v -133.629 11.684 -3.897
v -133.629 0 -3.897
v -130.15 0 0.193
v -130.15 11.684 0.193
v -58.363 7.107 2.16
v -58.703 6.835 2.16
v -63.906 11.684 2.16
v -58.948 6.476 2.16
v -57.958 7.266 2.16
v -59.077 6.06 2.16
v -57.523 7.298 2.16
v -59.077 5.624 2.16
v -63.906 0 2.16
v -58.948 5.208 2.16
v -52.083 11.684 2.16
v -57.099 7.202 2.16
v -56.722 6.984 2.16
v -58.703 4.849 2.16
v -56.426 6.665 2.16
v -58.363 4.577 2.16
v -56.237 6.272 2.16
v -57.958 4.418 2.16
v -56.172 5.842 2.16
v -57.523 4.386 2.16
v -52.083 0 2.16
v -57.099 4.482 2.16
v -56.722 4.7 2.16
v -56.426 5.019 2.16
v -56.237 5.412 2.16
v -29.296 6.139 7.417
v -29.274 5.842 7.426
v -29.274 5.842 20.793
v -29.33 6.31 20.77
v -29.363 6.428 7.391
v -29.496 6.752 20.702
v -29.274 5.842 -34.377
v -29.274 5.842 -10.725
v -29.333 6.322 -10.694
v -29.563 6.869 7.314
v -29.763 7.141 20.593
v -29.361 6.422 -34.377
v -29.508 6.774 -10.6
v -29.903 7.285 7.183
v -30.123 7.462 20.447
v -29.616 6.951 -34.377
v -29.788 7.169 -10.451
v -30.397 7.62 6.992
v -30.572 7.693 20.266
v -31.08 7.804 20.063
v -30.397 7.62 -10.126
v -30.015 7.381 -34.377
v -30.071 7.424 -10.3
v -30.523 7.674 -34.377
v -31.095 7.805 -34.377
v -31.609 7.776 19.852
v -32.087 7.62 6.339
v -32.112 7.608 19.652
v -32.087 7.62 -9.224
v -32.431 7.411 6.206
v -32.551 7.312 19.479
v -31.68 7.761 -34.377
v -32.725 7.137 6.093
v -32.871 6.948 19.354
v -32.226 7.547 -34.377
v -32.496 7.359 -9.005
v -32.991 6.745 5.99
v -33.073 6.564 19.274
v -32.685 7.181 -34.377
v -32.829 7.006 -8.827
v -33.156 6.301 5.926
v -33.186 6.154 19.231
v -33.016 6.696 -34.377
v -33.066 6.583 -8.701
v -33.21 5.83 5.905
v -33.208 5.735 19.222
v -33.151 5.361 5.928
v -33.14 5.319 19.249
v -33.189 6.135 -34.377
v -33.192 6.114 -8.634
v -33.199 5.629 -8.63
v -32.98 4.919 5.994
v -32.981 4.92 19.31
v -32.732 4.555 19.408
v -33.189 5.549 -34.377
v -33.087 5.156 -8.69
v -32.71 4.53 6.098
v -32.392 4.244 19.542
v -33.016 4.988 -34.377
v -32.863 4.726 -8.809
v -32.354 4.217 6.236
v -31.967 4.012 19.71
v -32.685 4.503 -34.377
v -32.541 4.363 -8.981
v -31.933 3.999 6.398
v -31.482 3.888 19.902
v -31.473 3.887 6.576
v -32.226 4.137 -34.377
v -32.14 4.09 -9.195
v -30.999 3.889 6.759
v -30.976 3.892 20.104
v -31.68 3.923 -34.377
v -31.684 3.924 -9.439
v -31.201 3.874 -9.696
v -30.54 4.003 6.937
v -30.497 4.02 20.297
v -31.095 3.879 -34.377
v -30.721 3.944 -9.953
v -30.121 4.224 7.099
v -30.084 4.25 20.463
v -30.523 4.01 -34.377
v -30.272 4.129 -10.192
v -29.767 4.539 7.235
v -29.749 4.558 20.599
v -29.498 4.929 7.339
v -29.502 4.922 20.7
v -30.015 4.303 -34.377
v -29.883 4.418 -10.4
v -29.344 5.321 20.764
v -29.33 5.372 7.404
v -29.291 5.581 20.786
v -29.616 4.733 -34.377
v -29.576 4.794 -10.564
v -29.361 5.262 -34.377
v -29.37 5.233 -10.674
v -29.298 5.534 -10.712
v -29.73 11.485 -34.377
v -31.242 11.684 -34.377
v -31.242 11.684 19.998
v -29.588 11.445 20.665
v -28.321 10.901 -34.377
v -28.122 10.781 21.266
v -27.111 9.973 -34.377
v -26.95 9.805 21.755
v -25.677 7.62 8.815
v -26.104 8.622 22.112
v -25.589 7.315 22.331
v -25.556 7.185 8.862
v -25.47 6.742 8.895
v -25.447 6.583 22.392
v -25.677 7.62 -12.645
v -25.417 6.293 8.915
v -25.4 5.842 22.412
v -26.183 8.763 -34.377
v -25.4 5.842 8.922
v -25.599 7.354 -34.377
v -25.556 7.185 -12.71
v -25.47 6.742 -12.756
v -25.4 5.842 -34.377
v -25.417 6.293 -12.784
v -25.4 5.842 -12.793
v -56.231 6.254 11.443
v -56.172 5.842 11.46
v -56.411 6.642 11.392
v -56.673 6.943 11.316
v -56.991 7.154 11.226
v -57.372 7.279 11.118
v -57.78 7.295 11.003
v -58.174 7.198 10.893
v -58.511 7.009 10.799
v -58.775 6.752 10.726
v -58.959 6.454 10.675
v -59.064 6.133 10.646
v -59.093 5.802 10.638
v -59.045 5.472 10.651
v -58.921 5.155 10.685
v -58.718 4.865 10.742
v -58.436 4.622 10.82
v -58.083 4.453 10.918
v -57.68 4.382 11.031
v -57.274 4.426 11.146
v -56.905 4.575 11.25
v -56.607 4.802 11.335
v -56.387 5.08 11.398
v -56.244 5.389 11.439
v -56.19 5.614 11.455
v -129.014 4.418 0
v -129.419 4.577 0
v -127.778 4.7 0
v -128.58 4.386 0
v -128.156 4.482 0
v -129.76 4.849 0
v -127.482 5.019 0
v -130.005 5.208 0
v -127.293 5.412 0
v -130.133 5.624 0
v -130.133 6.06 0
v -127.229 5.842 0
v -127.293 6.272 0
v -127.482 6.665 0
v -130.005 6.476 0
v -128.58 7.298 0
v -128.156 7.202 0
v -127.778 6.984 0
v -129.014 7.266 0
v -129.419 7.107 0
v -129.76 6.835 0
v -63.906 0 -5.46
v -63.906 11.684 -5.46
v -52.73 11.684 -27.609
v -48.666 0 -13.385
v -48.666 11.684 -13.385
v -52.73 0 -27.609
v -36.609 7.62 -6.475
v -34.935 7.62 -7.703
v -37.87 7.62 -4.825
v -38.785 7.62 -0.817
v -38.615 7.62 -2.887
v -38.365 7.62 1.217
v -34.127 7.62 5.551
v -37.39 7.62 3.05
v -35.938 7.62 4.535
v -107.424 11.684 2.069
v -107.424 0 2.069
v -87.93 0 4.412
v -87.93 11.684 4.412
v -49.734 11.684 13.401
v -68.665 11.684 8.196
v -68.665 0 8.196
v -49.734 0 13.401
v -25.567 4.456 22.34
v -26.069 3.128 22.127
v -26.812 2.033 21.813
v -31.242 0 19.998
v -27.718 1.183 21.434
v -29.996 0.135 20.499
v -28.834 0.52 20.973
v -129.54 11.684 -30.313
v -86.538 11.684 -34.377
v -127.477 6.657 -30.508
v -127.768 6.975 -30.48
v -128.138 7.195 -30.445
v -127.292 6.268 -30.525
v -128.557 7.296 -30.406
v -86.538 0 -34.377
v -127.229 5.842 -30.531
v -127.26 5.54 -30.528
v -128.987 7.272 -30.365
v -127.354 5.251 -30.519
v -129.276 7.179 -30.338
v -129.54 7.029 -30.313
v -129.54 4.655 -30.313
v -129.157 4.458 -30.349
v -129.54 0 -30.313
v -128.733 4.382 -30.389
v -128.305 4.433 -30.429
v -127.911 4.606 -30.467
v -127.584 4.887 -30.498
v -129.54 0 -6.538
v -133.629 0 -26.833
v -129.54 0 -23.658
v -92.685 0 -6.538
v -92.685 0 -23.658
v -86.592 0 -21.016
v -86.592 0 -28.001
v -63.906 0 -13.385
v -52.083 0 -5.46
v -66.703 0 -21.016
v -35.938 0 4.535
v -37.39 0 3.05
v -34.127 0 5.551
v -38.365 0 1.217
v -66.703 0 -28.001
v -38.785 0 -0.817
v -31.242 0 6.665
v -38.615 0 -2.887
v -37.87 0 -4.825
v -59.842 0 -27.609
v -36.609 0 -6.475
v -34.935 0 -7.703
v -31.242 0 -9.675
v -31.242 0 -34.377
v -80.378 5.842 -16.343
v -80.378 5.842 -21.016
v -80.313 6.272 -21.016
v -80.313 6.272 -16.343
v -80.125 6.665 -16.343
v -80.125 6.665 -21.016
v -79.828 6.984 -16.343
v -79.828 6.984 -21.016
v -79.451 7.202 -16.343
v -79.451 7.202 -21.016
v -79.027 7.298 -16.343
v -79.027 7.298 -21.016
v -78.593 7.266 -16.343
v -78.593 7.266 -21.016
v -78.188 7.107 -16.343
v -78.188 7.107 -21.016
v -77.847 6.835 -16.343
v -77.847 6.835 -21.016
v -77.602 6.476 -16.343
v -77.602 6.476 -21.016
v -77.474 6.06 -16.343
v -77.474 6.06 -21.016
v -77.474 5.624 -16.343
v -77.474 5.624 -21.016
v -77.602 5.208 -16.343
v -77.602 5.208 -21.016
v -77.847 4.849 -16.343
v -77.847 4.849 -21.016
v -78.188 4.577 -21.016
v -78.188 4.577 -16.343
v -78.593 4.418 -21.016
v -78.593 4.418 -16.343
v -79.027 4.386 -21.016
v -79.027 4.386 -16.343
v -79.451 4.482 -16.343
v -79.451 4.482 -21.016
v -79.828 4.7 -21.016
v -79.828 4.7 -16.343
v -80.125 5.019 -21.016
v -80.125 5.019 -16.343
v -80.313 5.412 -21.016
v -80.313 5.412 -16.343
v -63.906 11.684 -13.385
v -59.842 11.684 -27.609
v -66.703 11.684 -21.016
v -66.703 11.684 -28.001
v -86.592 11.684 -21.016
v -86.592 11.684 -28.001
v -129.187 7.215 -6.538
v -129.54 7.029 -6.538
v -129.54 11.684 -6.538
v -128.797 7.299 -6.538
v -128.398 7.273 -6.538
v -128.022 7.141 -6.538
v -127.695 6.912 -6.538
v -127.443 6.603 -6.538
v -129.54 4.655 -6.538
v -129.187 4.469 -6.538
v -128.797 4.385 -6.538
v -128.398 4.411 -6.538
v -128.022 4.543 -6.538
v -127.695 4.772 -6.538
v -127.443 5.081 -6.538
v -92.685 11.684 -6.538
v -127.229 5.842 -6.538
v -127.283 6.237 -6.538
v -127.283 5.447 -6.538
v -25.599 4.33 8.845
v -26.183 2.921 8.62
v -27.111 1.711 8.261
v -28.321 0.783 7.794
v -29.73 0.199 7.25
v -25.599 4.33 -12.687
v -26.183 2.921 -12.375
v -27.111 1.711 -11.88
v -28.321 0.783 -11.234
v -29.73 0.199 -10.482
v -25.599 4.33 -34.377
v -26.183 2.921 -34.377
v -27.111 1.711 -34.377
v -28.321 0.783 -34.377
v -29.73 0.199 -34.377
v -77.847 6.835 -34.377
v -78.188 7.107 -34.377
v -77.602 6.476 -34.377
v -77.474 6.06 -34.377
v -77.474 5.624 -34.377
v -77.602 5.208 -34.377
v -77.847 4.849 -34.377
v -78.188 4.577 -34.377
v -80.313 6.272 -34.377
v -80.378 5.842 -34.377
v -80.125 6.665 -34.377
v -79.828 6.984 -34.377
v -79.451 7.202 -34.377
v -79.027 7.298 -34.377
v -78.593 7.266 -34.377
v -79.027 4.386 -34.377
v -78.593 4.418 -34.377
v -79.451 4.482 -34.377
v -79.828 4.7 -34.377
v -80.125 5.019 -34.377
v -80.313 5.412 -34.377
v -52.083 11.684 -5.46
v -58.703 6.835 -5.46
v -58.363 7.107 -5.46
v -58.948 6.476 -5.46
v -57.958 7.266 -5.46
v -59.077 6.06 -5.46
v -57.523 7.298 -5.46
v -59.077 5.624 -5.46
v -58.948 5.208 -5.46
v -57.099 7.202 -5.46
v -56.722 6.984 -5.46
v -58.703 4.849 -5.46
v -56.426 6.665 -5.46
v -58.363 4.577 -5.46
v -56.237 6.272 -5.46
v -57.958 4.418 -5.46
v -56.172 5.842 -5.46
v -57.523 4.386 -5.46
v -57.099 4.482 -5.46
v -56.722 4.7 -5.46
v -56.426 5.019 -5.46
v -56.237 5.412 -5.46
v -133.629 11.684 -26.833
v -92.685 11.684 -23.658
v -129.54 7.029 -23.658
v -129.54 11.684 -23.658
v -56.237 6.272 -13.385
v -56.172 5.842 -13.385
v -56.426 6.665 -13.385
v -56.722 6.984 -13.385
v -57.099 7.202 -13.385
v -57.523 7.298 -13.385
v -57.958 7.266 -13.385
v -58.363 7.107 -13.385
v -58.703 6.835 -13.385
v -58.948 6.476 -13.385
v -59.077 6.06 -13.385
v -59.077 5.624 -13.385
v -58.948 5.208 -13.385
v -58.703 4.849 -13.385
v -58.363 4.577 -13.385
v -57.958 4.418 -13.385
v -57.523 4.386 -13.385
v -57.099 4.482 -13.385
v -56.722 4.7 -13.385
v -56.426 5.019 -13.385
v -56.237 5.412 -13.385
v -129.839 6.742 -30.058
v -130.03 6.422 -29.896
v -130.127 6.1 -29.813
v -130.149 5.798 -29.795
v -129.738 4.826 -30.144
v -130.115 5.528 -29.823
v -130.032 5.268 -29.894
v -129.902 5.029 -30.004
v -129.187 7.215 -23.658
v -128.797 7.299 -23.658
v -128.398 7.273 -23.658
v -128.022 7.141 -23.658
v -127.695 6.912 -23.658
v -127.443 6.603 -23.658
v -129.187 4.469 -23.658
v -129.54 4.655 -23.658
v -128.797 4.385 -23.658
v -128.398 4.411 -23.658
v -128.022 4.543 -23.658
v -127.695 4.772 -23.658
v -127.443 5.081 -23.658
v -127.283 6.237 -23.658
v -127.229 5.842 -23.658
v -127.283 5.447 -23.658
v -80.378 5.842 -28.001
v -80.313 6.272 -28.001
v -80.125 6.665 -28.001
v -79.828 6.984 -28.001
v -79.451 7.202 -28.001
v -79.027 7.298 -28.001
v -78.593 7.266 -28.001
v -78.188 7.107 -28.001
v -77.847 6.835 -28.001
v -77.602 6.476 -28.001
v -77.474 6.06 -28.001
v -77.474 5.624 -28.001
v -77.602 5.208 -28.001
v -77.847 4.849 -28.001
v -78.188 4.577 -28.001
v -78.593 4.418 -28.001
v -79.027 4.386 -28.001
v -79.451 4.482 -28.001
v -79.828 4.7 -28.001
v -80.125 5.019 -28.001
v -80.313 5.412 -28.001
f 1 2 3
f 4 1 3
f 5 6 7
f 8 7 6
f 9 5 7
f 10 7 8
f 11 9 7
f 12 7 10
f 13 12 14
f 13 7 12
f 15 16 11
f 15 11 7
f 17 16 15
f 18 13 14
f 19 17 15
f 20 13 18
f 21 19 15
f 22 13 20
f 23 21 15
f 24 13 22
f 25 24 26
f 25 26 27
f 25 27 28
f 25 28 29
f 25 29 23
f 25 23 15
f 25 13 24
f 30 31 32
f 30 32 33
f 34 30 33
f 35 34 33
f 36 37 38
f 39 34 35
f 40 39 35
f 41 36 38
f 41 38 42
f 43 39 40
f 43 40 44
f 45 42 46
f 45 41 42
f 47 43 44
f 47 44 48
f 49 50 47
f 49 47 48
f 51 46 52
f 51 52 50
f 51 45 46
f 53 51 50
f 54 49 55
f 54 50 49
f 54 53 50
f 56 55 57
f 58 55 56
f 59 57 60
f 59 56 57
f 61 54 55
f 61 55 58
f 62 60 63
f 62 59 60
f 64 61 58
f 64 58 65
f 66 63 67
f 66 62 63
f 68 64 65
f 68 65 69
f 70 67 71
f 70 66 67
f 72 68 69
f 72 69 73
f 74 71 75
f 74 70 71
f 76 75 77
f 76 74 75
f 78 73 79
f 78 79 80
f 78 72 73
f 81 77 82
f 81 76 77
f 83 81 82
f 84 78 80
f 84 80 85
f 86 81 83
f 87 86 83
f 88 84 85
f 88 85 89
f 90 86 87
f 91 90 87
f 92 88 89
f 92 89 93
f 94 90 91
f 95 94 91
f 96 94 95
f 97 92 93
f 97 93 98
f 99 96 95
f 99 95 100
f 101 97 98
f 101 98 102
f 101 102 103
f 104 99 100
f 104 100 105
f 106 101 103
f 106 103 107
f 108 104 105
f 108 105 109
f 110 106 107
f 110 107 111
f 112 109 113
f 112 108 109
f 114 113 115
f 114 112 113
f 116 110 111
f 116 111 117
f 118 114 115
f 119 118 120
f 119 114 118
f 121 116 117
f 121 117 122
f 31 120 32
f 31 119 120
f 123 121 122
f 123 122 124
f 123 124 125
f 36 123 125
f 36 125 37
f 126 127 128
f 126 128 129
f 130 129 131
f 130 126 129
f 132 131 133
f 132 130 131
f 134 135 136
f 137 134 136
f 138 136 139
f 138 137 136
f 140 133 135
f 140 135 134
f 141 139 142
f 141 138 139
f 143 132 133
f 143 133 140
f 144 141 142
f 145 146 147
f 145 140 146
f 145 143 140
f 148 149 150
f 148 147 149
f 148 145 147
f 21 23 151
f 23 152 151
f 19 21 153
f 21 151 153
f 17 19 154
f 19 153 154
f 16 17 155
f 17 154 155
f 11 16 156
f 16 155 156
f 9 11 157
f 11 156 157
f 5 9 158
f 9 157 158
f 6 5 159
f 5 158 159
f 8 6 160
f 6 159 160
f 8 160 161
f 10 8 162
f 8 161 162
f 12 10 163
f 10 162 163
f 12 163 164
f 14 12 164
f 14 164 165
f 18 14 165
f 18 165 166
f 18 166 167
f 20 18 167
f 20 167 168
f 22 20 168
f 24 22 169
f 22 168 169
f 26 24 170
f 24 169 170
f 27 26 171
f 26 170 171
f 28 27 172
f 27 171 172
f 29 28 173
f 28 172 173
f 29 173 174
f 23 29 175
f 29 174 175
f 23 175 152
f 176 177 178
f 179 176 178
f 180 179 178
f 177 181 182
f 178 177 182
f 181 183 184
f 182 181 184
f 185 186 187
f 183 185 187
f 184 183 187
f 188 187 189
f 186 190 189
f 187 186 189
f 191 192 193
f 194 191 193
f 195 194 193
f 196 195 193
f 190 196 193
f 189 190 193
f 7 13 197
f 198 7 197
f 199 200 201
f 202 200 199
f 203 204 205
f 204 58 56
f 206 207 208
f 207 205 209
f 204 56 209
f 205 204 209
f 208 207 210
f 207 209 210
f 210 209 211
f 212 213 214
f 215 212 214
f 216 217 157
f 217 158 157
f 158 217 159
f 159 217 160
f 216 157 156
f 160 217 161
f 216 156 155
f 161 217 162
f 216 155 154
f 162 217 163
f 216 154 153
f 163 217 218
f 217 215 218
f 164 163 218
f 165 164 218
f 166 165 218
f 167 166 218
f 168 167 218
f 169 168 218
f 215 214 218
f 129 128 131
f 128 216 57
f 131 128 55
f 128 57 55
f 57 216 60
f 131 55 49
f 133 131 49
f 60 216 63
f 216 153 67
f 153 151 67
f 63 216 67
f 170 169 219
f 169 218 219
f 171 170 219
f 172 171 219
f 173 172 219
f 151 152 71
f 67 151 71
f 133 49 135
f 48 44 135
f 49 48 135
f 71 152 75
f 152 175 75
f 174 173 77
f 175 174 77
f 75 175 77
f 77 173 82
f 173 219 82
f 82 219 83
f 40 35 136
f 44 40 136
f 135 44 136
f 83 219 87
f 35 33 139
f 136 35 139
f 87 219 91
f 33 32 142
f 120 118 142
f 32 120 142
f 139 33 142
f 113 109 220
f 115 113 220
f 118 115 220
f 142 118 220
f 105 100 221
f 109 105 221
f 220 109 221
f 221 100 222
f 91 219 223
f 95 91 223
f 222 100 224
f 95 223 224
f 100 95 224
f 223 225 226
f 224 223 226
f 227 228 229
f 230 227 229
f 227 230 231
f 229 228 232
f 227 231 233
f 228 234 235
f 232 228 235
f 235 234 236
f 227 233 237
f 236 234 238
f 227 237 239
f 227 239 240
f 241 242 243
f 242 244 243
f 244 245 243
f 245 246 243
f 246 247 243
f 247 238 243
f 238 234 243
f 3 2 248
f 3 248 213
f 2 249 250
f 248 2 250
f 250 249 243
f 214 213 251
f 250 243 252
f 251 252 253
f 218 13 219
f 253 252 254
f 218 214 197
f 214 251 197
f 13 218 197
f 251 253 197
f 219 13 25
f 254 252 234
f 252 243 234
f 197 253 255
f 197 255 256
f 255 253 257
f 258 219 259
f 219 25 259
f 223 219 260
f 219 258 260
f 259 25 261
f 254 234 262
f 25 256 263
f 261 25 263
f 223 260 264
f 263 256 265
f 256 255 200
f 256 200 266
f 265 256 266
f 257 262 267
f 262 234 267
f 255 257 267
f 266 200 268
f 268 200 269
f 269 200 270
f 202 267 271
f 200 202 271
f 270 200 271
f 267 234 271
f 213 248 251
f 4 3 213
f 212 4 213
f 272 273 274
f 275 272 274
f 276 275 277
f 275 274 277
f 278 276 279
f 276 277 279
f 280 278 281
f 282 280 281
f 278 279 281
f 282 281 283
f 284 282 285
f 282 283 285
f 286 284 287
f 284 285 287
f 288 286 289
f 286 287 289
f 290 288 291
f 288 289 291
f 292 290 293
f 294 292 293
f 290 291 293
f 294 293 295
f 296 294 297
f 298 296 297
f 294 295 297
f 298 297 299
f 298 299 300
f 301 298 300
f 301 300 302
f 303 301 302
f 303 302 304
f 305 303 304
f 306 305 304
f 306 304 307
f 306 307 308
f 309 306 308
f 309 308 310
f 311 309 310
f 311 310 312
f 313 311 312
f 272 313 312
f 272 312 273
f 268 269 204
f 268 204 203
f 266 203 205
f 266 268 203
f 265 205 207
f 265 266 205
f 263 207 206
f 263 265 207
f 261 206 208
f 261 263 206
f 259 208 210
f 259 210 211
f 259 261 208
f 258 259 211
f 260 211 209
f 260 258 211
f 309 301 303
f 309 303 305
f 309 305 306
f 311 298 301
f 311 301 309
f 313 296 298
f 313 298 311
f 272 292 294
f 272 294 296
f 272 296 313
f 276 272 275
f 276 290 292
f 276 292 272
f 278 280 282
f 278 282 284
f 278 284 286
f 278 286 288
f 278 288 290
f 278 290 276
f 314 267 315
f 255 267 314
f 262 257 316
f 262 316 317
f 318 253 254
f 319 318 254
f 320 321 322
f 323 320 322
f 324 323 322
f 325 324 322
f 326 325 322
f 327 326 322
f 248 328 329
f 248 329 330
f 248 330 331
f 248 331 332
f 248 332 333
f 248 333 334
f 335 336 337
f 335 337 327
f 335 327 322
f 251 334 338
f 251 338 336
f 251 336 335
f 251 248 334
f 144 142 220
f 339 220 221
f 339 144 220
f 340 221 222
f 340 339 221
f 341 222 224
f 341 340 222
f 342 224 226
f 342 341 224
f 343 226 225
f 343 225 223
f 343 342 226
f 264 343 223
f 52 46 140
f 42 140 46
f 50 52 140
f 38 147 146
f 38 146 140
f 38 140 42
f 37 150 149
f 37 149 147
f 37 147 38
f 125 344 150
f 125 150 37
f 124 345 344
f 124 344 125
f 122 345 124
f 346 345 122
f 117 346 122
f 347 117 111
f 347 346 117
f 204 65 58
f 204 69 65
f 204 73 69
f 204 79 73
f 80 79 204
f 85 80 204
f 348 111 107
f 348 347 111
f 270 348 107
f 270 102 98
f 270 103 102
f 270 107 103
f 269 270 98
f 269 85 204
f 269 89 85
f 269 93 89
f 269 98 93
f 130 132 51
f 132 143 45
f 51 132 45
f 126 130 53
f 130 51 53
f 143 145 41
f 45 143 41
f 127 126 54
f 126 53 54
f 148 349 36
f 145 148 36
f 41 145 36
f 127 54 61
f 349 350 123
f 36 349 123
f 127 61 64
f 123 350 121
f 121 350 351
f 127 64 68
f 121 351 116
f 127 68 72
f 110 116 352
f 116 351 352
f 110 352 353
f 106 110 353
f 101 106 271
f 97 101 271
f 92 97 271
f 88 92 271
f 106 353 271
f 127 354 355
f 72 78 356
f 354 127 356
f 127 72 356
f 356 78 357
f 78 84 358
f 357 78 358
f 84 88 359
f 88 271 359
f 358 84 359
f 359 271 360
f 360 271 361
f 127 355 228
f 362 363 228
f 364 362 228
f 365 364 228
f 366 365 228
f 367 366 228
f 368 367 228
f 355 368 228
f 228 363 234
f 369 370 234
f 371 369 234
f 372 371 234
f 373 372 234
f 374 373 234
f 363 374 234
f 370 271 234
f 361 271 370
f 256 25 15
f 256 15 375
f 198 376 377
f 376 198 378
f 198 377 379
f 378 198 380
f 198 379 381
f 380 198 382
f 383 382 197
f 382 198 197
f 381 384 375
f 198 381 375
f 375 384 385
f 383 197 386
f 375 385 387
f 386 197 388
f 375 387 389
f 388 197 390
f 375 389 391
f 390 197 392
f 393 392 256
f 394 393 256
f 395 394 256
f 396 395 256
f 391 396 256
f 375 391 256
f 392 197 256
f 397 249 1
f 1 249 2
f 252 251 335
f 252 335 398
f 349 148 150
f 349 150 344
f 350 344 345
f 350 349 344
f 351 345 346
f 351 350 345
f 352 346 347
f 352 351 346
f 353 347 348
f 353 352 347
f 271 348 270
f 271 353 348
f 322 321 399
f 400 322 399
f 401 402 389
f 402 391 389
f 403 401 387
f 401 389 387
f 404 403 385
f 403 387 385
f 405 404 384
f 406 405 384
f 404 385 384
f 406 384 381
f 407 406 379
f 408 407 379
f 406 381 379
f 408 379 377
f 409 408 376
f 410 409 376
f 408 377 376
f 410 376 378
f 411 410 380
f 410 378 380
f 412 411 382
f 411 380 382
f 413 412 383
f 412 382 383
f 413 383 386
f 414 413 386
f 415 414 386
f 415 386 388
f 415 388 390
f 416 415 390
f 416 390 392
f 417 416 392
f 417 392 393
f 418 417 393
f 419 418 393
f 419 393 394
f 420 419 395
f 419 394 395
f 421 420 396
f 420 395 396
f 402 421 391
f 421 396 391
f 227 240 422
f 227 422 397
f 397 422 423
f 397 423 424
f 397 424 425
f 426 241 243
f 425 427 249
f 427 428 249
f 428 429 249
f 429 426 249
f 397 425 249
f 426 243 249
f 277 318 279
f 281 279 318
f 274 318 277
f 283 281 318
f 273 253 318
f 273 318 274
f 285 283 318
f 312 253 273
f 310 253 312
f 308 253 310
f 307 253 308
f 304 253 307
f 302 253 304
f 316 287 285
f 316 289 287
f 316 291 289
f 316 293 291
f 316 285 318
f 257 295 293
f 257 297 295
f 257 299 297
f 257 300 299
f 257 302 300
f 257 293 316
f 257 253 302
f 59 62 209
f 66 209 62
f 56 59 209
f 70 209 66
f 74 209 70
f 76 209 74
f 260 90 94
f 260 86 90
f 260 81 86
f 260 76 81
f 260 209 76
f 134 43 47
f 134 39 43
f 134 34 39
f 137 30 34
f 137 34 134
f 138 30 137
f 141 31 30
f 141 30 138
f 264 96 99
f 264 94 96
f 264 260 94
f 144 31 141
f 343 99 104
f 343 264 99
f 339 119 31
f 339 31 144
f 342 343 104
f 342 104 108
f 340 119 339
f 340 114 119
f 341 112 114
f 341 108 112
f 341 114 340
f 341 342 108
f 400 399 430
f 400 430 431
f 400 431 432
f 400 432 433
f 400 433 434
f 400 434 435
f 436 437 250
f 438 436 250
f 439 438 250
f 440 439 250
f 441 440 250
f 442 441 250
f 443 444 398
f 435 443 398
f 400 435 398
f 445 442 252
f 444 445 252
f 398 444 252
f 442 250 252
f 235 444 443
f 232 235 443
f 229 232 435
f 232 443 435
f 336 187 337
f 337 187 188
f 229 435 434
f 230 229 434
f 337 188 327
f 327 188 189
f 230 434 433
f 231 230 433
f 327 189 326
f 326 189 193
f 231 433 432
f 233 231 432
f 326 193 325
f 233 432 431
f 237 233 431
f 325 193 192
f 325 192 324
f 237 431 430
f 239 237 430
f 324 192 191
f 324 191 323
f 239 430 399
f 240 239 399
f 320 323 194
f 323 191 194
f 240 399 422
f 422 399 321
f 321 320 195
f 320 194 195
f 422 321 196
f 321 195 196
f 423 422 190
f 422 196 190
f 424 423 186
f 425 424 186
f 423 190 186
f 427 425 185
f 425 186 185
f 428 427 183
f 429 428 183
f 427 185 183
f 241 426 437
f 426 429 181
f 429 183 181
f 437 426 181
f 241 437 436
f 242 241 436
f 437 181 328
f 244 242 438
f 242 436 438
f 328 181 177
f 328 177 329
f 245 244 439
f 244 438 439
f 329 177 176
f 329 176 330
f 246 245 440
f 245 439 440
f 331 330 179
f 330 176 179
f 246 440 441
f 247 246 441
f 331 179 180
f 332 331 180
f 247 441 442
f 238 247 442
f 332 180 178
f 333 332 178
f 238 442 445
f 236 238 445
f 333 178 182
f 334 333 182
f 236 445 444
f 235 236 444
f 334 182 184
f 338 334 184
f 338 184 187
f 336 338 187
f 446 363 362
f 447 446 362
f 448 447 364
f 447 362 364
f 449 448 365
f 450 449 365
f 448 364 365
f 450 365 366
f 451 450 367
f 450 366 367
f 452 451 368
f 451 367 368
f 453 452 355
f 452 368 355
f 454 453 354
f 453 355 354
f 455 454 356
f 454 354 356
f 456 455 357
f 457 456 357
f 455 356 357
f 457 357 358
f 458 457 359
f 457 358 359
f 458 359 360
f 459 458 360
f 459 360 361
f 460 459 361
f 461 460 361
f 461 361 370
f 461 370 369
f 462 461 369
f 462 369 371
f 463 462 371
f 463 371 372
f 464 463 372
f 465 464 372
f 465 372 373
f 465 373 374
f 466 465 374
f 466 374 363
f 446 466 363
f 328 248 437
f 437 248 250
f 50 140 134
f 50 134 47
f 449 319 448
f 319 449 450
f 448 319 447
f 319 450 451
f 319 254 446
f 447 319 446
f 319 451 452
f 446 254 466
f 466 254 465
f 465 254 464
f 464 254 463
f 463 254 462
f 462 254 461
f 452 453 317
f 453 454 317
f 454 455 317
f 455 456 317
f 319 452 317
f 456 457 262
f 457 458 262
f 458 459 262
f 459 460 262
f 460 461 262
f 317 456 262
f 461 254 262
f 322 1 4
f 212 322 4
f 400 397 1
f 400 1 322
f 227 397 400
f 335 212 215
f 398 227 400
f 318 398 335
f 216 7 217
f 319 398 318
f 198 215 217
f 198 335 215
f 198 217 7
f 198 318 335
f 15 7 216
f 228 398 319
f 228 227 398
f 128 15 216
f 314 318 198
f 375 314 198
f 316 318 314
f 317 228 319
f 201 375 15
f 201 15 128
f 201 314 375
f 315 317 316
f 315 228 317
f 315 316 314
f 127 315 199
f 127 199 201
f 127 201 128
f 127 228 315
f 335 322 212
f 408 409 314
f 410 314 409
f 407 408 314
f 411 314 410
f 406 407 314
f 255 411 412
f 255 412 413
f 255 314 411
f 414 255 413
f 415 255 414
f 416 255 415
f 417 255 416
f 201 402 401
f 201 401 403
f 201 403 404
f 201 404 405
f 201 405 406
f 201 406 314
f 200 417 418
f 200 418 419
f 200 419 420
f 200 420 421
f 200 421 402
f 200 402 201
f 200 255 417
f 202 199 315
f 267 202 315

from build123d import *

# Parameters (mm, degrees)
SKETCH1_W                = 36.8554
SKETCH1_H                = 17.1196
SKETCH1_W_2              = 19.8882
SKETCH1_H_2              = 6.985
SKETCH1_W_3              = 11.8237
SKETCH1_H_3              = 7.62
BOSS_EXTRUDE1_DEPTH      = 11.684
CUT_EXTRUDE7_DEPTH       = 139.474144195
CUT_EXTRUDE7_DEPTH_BACK  = 139.474144195
SKETCH3_R                = 1.4605
CUT_EXTRUDE8_DEPTH       = 139.474144228
SKETCH4_R                = 1.4605
CUT_EXTRUDE9_DEPTH       = 18.034
SKETCH5_R                = 1.4605
CUT_EXTRUDE10_DEPTH      = 16.3195
CUT_EXTRUDE11_DEPTH      = 139.474144228
CUT_EXTRUDE11_DEPTH_BACK = 139.474144228
SKETCH6_R                = 1.9685
CUT_EXTRUDE12_DEPTH      = 7.62


with BuildPart() as part:
    # Sketch1 → Boss-Extrude1 (new body)
    with BuildSketch(Plane(origin=(0, 0, 0), x_dir=(1, 0, 0), z_dir=(0, 1, 0))):
        with BuildLine():
            Line((-25.4, 34.376681198), (-67.6656, 34.376681198))
            Line((-67.6656, 34.376681198), (-86.5378, 34.376681198))
            Line((-86.5378, 34.376681198), (-129.54, 30.312681198))
            Line((-129.54, 30.312681198), (-133.6294, 26.832881198))
            Line((-133.6294, 26.832881198), (-133.6294, 3.896681198))
            Line((-133.6294, 3.896681198), (-130.1496, -0.192718802))
            Line((-130.1496, -0.192718802), (-107.423789895, -2.069465817))
            ThreePointArc((-107.423789895, -2.069465817), (-65.592867309, -8.938068561), (-25.4, -22.411642903))
            Line((-25.4, -22.411642903), (-25.4, 34.376681198))
        make_face()
        with Locations((-111.1123, 15.098081198)):
            Rectangle(SKETCH1_W, SKETCH1_H, mode=Mode.SUBTRACT)
        with Locations((-76.64751862, 24.508781198)):
            Rectangle(SKETCH1_W_2, SKETCH1_H_2, mode=Mode.SUBTRACT)
        with Locations((-57.99455, 1.650285214)):
            Rectangle(SKETCH1_W_3, SKETCH1_H_3, mode=Mode.SUBTRACT)
        Polygon((-63.9064, 13.384739375), (-48.6664, 13.384739375), (-52.7304, 27.608739375), (-59.8424, 27.608739375), align=None, mode=Mode.SUBTRACT)
    extrude(amount=BOSS_EXTRUDE1_DEPTH)

    # Sketch2 → Cut-Extrude7 (cut, two sides: drawn at the far end of the back side and taken through both)
    with BuildSketch(Plane.XY.offset(-CUT_EXTRUDE7_DEPTH_BACK)):
        with BuildLine():
            Line((-25.4, 11.684), (-31.242, 11.684))
            ThreePointArc((-31.242, 11.684), (-27.111082184, 9.972917816), (-25.4, 5.842))
            Line((-25.4, 5.842), (-25.4, 11.684))
        make_face()
        with BuildLine():
            Line((-25.4, 0), (-25.4, 5.842))
            ThreePointArc((-25.4, 5.842), (-27.111082184, 1.711082184), (-31.242, 0))
            Line((-31.242, 0), (-25.4, 0))
        make_face()
    extrude(amount=CUT_EXTRUDE7_DEPTH + CUT_EXTRUDE7_DEPTH_BACK, mode=Mode.SUBTRACT)

    # Sketch3 → Cut-Extrude8 (cut, through all)
    with BuildSketch(Plane.XY):
        with Locations((-128.6891, 5.842)):
            Circle(SKETCH3_R)
    extrude(amount=-CUT_EXTRUDE8_DEPTH, mode=Mode.SUBTRACT)

    # Sketch4 → Cut-Extrude9 (cut)
    with BuildSketch(Plane(origin=(0, 0, -34.376681198), x_dir=(-1, 0, 0), z_dir=(0, 0, -1))):
        with Locations((78.9178, 5.842)):
            Circle(SKETCH4_R)
    extrude(amount=-CUT_EXTRUDE9_DEPTH, mode=Mode.SUBTRACT)

    # Sketch5 → Cut-Extrude10 (cut, symmetric)
    with BuildSketch(Plane.XY):
        with Locations((-57.6326, 5.842)):
            Circle(SKETCH5_R)
    extrude(amount=CUT_EXTRUDE10_DEPTH, both=True, mode=Mode.SUBTRACT)

    # Sketch6 → Cut-Extrude11 (cut, two sides: drawn at the far end of the back side and taken through both)
    with BuildSketch(Plane.XY.offset(-CUT_EXTRUDE11_DEPTH_BACK)):
        with Locations((-31.242, 5.842)):
            Circle(SKETCH6_R)
    extrude(amount=CUT_EXTRUDE11_DEPTH + CUT_EXTRUDE11_DEPTH_BACK, mode=Mode.SUBTRACT)

    # Sketch8 → Cut-Extrude12 (cut)
    with BuildSketch(Plane.XZ):
        with BuildLine():
            Line((-34.127459258, 5.550738999), (-23.258487089, 9.749460917))
            Line((-23.258487089, 9.749460917), (-23.258487089, -12.81023225))
            Line((-23.258487089, -12.81023225), (-23.258487089, -13.936212277))
            Line((-23.258487089, -13.936212277), (-34.934853819, -7.703267827))
            ThreePointArc((-34.934853819, -7.703267827), (-38.784988232, -0.817133676), (-34.127459258, 5.550738999))
        make_face()
    extrude(amount=-CUT_EXTRUDE12_DEPTH, mode=Mode.SUBTRACT)


solid = part.part
